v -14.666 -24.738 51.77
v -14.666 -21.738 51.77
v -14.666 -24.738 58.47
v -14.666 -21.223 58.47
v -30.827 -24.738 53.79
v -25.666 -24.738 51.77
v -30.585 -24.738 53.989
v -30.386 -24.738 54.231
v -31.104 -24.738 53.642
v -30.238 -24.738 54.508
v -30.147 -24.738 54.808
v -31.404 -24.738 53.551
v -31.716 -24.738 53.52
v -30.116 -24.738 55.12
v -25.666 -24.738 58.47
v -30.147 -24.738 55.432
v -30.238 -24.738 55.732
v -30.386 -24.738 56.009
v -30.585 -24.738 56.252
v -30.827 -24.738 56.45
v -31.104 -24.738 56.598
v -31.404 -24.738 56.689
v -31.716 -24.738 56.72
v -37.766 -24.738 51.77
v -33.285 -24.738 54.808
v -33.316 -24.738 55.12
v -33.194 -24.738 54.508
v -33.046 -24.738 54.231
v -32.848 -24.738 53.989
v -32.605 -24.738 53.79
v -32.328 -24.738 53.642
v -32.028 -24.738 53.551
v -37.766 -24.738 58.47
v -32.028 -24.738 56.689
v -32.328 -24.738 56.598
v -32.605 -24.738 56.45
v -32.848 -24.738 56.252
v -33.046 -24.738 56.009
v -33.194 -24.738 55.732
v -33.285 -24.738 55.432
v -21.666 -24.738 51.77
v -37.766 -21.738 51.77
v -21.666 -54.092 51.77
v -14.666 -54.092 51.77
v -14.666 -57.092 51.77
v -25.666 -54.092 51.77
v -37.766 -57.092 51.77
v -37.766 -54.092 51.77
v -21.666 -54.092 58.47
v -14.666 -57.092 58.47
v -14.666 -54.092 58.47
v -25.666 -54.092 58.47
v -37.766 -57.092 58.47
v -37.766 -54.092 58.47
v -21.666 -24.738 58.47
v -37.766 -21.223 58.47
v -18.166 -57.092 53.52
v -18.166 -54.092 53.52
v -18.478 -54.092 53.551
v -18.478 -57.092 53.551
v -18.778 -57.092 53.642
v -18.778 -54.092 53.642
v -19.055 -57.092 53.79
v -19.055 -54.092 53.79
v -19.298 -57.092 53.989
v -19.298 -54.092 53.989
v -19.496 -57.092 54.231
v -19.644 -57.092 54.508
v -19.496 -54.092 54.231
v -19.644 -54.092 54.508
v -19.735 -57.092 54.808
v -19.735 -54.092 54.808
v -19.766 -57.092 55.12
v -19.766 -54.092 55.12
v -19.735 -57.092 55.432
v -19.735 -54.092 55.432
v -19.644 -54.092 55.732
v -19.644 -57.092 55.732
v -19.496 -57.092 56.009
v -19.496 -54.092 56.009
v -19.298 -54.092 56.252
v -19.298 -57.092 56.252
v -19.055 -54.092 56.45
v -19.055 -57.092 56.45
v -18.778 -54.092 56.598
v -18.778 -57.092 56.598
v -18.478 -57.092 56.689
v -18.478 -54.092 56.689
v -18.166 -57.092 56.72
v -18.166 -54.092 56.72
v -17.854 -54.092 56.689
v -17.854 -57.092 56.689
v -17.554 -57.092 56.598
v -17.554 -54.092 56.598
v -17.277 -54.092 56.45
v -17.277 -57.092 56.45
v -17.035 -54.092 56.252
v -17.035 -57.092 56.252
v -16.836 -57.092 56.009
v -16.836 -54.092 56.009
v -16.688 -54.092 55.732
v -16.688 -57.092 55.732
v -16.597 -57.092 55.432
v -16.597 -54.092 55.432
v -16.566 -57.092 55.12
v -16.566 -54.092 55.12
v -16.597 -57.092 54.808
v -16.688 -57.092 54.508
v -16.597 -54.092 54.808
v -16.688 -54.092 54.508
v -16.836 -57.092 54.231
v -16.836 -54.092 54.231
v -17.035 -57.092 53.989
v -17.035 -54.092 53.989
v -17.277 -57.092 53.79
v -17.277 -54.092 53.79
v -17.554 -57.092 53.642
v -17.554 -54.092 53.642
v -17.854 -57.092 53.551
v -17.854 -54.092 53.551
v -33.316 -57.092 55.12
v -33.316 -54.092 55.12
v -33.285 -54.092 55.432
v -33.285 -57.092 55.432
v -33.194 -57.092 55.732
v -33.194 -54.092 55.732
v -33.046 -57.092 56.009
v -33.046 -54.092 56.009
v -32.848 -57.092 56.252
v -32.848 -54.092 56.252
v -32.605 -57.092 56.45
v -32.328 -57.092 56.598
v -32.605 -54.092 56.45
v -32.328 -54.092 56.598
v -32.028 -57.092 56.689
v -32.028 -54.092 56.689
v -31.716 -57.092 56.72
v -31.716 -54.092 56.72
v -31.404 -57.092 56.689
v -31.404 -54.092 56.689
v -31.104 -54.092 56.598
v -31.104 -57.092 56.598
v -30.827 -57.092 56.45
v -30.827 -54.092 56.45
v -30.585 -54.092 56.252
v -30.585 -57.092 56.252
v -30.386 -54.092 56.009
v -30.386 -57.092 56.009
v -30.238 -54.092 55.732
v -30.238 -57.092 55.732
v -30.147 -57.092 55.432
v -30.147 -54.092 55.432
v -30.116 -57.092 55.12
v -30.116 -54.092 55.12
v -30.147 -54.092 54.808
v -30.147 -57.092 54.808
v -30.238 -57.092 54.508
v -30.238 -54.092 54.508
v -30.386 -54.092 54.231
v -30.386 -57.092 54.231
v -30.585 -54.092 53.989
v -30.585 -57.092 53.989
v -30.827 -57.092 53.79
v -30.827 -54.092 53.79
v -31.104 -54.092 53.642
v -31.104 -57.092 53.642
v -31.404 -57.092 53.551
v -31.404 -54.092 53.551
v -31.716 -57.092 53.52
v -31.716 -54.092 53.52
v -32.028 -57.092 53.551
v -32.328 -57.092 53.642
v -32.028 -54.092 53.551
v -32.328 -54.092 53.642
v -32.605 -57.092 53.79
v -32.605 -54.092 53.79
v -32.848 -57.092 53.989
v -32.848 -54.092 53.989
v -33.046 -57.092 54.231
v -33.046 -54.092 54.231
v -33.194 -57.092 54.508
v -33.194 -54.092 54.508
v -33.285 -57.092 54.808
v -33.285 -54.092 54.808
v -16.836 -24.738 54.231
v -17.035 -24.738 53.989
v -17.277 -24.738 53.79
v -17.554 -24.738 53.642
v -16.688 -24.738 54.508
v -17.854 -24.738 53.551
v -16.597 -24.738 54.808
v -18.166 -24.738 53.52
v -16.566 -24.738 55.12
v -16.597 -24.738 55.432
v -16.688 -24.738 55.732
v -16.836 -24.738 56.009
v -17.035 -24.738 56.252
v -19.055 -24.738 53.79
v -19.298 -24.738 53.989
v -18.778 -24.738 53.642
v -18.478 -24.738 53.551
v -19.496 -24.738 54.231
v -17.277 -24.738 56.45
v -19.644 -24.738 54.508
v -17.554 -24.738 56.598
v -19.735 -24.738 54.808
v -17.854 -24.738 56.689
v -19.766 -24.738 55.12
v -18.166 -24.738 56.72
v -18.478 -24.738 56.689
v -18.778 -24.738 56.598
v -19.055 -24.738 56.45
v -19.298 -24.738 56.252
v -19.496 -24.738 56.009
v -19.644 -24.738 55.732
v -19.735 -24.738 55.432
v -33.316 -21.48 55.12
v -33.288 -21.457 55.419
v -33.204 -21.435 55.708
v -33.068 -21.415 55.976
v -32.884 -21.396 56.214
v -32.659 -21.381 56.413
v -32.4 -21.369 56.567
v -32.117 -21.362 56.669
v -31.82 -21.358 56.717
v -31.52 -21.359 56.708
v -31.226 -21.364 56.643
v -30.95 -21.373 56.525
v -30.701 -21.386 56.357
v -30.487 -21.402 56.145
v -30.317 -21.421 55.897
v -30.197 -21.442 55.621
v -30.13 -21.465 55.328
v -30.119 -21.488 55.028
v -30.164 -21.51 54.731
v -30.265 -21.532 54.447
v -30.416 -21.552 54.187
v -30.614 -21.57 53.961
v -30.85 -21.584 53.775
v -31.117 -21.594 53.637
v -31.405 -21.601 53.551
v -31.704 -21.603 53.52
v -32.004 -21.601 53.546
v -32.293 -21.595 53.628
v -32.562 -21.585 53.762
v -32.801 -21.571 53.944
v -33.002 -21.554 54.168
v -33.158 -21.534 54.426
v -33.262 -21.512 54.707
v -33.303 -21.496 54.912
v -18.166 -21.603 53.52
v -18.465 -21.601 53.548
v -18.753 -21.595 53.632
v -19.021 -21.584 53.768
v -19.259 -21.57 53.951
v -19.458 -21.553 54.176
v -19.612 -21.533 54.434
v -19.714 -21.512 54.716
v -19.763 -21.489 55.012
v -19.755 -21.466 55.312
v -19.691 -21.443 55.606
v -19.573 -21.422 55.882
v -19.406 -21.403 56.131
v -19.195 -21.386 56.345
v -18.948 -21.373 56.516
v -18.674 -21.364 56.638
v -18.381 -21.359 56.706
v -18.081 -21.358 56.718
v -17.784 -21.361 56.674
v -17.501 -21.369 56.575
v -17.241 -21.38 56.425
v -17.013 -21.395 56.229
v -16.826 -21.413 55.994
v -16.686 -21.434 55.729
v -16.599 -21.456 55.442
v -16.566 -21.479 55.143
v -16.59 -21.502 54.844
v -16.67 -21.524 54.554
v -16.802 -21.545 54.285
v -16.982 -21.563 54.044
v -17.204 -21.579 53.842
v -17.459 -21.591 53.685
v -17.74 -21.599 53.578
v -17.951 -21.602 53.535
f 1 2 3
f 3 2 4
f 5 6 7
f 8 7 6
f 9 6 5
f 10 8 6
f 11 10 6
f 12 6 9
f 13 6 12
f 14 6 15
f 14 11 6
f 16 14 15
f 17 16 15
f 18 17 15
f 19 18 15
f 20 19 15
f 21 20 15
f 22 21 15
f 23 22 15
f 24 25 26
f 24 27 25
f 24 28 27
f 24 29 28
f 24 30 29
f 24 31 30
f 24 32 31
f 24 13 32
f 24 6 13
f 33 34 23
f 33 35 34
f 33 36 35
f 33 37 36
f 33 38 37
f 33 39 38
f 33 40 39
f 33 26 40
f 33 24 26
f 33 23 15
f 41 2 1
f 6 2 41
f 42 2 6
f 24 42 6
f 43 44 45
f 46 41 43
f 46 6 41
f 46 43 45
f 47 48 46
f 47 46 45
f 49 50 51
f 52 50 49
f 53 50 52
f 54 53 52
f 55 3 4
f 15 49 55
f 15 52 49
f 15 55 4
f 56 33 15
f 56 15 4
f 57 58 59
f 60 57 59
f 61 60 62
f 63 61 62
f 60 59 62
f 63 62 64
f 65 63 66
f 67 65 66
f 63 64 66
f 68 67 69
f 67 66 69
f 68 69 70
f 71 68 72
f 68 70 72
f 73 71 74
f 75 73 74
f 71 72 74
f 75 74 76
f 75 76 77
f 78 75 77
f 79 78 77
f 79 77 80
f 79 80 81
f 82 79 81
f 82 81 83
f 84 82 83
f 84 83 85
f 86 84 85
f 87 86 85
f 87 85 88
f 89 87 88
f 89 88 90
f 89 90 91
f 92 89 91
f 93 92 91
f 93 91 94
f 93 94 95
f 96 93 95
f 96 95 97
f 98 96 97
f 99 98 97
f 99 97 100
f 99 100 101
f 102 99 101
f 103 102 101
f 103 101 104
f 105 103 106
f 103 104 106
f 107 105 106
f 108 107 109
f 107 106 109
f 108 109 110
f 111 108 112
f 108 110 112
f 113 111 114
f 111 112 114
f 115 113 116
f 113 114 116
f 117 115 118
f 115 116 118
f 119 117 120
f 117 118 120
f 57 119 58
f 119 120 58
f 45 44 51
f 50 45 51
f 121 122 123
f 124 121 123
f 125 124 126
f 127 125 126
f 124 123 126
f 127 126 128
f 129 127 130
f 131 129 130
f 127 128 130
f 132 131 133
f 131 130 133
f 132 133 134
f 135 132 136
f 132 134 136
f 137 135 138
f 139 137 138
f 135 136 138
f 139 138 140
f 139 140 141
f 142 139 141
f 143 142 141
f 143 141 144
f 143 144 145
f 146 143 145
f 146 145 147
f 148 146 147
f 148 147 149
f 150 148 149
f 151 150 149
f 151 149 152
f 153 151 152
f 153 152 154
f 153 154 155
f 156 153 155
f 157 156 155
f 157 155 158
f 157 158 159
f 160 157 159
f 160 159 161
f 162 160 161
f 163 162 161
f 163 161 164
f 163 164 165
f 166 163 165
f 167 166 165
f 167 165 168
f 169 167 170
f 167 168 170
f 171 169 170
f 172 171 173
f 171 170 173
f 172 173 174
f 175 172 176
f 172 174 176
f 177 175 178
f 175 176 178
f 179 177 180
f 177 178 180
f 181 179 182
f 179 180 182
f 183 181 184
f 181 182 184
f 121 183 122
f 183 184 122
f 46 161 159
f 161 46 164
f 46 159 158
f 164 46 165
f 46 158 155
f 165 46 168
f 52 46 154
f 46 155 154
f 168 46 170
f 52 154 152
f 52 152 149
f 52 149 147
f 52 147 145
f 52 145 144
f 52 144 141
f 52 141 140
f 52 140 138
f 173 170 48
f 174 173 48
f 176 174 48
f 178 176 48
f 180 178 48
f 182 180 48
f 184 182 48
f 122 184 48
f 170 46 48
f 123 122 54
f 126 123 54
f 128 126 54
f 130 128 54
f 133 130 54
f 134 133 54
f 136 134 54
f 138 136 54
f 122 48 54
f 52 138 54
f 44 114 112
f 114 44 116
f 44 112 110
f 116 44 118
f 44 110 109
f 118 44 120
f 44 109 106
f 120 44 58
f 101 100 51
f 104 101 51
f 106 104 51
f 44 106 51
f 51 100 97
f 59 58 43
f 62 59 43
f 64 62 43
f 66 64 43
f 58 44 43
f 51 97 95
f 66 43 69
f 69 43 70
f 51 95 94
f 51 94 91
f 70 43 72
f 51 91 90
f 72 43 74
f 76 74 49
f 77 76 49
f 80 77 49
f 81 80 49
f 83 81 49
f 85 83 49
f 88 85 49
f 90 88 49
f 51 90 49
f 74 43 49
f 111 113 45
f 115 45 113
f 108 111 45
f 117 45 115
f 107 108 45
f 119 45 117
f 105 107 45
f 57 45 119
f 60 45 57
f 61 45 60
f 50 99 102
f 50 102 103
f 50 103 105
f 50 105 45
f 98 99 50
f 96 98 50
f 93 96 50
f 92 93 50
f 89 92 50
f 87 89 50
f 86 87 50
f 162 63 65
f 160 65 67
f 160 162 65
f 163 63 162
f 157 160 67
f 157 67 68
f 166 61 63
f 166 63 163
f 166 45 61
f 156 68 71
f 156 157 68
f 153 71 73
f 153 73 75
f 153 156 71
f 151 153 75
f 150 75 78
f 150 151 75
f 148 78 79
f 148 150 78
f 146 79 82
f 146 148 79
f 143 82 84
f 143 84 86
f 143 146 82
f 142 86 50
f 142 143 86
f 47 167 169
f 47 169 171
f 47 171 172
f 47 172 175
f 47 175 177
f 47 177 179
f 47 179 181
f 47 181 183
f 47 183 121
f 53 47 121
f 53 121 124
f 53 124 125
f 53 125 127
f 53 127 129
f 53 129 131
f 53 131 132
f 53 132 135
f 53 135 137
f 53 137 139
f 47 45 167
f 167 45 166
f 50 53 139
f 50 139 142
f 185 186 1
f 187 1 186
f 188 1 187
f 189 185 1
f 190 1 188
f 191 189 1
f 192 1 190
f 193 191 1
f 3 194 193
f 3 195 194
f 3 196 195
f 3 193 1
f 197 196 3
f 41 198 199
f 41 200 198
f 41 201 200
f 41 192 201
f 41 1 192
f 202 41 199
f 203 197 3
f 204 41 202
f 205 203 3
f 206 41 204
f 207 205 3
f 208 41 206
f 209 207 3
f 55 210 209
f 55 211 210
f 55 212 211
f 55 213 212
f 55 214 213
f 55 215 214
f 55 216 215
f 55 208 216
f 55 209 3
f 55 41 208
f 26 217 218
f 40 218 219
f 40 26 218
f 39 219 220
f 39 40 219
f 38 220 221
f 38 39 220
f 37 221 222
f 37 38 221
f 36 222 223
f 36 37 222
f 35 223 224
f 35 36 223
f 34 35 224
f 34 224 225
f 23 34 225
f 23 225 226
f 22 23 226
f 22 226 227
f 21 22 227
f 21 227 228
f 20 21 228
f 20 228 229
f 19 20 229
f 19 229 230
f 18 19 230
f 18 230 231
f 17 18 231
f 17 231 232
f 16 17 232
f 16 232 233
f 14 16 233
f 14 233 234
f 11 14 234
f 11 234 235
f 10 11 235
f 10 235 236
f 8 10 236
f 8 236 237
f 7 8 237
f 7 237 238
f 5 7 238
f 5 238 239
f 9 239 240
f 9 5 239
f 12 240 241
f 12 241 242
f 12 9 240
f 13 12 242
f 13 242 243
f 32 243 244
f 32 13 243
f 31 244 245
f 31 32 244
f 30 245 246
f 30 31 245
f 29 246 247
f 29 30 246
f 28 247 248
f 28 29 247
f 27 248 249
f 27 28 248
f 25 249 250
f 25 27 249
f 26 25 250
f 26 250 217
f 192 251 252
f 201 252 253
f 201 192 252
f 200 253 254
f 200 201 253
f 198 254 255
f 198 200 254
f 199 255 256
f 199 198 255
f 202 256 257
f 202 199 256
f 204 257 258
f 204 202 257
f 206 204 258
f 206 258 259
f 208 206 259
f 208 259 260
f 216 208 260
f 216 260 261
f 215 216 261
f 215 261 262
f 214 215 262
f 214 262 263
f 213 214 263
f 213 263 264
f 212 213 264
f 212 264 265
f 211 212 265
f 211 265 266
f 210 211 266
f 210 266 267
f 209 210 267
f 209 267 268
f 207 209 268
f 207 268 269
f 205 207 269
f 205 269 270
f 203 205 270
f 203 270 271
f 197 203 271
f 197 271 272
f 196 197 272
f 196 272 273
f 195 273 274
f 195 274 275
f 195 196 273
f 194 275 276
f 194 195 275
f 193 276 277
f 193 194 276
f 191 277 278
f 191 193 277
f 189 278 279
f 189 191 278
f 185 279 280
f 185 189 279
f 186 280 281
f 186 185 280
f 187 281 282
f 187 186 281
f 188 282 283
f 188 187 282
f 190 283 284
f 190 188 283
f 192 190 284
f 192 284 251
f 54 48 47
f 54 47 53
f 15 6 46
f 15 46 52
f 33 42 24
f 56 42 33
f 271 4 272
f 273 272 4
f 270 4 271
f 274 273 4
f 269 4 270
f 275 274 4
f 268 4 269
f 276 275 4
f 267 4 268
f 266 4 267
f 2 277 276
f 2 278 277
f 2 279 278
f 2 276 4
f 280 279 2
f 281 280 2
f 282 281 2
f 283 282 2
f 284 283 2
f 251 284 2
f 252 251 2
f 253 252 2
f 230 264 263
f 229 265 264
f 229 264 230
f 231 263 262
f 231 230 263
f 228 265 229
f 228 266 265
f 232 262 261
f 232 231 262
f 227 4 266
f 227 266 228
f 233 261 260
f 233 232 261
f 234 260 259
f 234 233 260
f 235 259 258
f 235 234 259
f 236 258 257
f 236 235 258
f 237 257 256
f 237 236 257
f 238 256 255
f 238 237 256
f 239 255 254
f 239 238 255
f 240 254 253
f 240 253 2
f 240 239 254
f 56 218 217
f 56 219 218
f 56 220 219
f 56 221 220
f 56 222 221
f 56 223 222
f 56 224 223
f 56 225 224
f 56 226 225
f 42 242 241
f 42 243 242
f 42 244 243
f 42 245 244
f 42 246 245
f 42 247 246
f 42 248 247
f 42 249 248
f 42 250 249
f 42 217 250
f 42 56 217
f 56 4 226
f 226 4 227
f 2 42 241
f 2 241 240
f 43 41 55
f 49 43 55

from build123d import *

# Parameters (mm, degrees)
SKETCH2_W                      = 6.7
SKETCH2_H                      = 3
BOSS_EXTRUDE1_DEPTH            = 12.100000416
BOSS_EXTRUDE1_2_DEPTH          = 12.100000416
BOSS_EXTRUDE2_START            = -12.1
SKETCH2_3_W                    = 6.7
SKETCH2_3_H                    = 3
SKETCH2_3_H_2                  = 29.35460187
BOSS_EXTRUDE2_DEPTH            = 4
CUT_EXTRUDE1_REACH             = 78.977
SKETCH3_R                      = 1.6
CUT_EXTRUDE1_DIRECTION_2_DEPTH = 77.976712266
BOSS_EXTRUDE4_START            = -16.100002
SKETCH2_4_W                    = 6.7
SKETCH2_4_H                    = 3
BOSS_EXTRUDE4_DEPTH            = 7
CUT_EXTRUDE2_REACH             = 78.977
SKETCH6_R                      = 1.6
CUT_EXTRUDE2_DIRECTION_2_DEPTH = 77.976712266


with BuildPart() as part:
    # Sketch2 → Boss-Extrude1 (new body)
    with BuildSketch(Plane.ZY.offset(37.766138352)):
        with Locations((55.120130346, -55.592329425)):
            Rectangle(SKETCH2_W, SKETCH2_H)
    extrude(amount=-BOSS_EXTRUDE1_DEPTH)



with BuildPart() as body_2:
    # Sketch2 → Boss-Extrude1 2 (new body)
    with BuildSketch(Plane.ZY.offset(37.766138352)):
        Polygon((51.770130346, -21.737727555), (51.770130346, -24.737727555), (58.470130346, -24.737727555), (58.470130346, -21.223242389), align=None)
    extrude(amount=-BOSS_EXTRUDE1_2_DEPTH)


with BuildPart() as part_1:
    add(part.part)

    add(body_2.part)  # Boss-Extrude2 merges body 2
    # Sketch2<3> → Boss-Extrude2 (add)
    with BuildSketch(Plane.ZY.offset(37.766138352).offset(BOSS_EXTRUDE2_START)):
        with Locations((55.120130346, -55.592329425)):
            Rectangle(SKETCH2_3_W, SKETCH2_3_H)
        with Locations((55.120130346, -39.41502849)):
            Rectangle(SKETCH2_3_W, SKETCH2_3_H_2)
        Polygon((51.770130346, -21.737727555), (51.770130346, -24.737727555), (58.470130346, -24.737727555), (58.470130346, -21.223242389), align=None)
    extrude(amount=-BOSS_EXTRUDE2_DEPTH)

    # Sketch3 → Cut-Extrude1 (cut, up to next)
    with BuildSketch(Plane(origin=(0, -54.092329425, 0), x_dir=(1, 0, 0), z_dir=(0, 1, 0)), mode=Mode.PRIVATE) as cut_extrude1_sk1:
        with Locations(Location((-31.716139041, -55.120130346, 0), (0, 0, 180))):
            Circle(SKETCH3_R)
    cut_extrude1_tool1 = extrude(cut_extrude1_sk1.sketch, amount=-CUT_EXTRUDE1_REACH, mode=Mode.PRIVATE) & part_1.part
    add(cut_extrude1_tool1.solids().sort_by_distance((-31.716139, -54.092329, 55.12013))[0], mode=Mode.SUBTRACT)

    # Sketch3 → Cut-Extrude1 direction 2 (cut)
    with BuildSketch(Plane(origin=(0, -54.092329425, 0), x_dir=(1, 0, 0), z_dir=(0, 1, 0))):
        with Locations(Location((-31.716139041, -55.120130346, 0), (0, 0, 180))):
            Circle(SKETCH3_R)
    extrude(amount=CUT_EXTRUDE1_DIRECTION_2_DEPTH, mode=Mode.SUBTRACT)


with BuildPart() as boss_extrude4_tool:
    # Sketch2<4> → Boss-Extrude4 (new body)
    with BuildSketch(Plane.ZY.offset(37.766138352).offset(BOSS_EXTRUDE4_START)):
        with Locations((55.120130346, -55.592329425)):
            Rectangle(SKETCH2_4_W, SKETCH2_4_H)
        Polygon((51.770130346, -21.737727555), (51.770130346, -24.737727555), (58.470130346, -24.737727555), (58.470130346, -21.223242389), align=None)
    extrude(amount=-BOSS_EXTRUDE4_DEPTH)


with BuildPart() as part_2:
    add(part_1.part)


with BuildPart() as part_3:
    # Boss-Extrude4: joined with boss_extrude4_tool
    add(part_2.part.fuse(boss_extrude4_tool.part, tol=0.00001))

    # Sketch6 → Cut-Extrude2 (cut, up to next)
    with BuildSketch(Plane(origin=(0, -54.092329425, 0), x_dir=(1, 0, 0), z_dir=(0, 1, 0)), mode=Mode.PRIVATE) as cut_extrude2_sk1:
        with Locations(Location((-18.166139731, -55.120130346, 0), (0, 0, 90))):
            Circle(SKETCH6_R)
    cut_extrude2_tool1 = extrude(cut_extrude2_sk1.sketch, amount=-CUT_EXTRUDE2_REACH, mode=Mode.PRIVATE) & part_3.part
    add(cut_extrude2_tool1.solids().sort_by_distance((-18.16614, -54.092329, 55.12013))[0], mode=Mode.SUBTRACT)

    # Sketch6 → Cut-Extrude2 direction 2 (cut)
    with BuildSketch(Plane(origin=(0, -54.092329425, 0), x_dir=(1, 0, 0), z_dir=(0, 1, 0))):
        with Locations(Location((-18.166139731, -55.120130346, 0), (0, 0, 90))):
            Circle(SKETCH6_R)
    extrude(amount=CUT_EXTRUDE2_DIRECTION_2_DEPTH, mode=Mode.SUBTRACT)


solid = part_3.part
